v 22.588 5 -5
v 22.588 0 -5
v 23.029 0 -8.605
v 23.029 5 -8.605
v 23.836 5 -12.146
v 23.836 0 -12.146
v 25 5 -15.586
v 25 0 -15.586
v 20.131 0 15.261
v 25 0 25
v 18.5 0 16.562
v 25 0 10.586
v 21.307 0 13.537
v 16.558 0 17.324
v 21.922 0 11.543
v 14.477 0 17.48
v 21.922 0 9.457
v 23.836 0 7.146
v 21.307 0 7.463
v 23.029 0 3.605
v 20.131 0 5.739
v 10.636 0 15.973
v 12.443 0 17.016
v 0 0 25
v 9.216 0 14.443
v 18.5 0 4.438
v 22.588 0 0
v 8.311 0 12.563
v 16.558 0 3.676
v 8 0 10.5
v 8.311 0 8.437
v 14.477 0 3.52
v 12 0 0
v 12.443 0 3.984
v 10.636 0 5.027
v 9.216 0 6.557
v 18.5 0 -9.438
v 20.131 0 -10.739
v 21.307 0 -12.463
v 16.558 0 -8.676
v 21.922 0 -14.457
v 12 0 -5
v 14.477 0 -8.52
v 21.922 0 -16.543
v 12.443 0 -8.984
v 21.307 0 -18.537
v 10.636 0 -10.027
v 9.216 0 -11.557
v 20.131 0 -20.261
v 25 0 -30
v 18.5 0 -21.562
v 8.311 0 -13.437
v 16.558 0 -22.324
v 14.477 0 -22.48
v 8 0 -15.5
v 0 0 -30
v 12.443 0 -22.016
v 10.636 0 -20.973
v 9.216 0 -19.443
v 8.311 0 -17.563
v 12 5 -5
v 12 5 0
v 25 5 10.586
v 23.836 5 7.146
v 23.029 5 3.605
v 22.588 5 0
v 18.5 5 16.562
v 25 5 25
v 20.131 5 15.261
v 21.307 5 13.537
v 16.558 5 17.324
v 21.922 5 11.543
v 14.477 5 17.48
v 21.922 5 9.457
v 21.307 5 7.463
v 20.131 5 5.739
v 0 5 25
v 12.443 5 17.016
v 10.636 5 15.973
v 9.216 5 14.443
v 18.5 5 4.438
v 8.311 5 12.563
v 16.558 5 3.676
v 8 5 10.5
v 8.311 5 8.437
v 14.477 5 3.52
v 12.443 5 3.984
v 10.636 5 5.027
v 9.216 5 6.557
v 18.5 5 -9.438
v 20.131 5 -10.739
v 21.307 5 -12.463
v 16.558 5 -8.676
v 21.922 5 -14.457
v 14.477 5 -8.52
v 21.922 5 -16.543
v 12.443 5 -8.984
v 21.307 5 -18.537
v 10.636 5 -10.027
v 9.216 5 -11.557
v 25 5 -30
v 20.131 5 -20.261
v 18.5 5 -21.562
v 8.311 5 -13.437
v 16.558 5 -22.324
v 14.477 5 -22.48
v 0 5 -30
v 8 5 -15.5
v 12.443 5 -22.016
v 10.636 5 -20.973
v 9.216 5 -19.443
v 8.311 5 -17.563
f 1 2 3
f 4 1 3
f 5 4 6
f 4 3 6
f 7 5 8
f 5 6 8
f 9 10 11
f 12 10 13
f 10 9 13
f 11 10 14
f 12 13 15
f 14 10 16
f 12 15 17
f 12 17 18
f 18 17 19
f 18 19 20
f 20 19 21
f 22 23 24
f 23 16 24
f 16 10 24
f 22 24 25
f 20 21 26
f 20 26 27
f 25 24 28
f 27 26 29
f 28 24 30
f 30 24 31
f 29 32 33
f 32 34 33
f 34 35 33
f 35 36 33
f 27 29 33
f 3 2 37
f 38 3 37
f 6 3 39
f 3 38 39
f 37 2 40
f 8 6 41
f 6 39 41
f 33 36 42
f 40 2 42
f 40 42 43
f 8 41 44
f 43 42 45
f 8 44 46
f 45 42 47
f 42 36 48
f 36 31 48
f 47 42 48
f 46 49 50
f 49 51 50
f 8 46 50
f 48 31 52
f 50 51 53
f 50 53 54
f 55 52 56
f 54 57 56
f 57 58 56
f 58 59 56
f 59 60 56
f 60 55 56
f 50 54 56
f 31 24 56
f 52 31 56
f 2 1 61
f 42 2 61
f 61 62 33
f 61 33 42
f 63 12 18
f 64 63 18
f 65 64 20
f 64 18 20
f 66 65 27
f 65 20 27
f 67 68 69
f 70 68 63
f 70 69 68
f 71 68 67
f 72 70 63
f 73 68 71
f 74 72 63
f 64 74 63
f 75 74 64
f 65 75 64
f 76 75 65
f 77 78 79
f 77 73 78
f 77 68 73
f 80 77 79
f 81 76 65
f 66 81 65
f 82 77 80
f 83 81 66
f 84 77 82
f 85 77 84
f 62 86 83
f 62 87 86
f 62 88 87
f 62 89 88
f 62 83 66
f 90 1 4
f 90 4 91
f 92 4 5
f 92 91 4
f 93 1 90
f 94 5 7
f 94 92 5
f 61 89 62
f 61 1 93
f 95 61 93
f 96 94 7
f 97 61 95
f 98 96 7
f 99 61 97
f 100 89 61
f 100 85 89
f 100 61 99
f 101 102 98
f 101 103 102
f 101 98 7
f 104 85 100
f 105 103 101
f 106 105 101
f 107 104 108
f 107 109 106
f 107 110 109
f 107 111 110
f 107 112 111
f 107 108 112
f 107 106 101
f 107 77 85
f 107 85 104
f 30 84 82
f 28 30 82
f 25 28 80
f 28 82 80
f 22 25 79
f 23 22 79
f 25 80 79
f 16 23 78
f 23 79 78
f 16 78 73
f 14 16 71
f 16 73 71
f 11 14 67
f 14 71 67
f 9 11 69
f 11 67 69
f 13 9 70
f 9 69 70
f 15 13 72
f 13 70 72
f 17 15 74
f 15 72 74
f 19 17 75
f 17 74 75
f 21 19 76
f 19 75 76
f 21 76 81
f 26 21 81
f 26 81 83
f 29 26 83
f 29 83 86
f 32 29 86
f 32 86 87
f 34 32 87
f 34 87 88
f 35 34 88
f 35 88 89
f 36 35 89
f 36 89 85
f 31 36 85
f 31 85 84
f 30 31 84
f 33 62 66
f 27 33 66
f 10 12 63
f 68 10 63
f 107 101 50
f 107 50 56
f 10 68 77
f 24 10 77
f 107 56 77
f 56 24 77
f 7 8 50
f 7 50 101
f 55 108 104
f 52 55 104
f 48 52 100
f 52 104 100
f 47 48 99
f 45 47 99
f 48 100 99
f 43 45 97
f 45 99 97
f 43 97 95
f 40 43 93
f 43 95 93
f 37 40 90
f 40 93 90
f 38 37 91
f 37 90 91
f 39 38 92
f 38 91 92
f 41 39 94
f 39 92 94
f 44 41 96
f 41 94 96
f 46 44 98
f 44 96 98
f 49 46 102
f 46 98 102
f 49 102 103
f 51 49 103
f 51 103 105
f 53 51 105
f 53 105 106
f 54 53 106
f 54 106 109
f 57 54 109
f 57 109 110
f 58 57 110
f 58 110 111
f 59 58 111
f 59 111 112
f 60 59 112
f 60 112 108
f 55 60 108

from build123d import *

# Parameters (mm, degrees)
SKETCH2_W                = 20
SKETCH2_H                = 5
BOSS_EXTRUDE2_DEPTH      = 25
BOSS_EXTRUDE3_DEPTH      = 5
BOSS_EXTRUDE3_DEPTH_BACK = 25
SKETCH3_W                = 5
SKETCH3_H                = 5
SKETCH4_W                = 25
SKETCH4_H                = 5
BOSS_EXTRUDE4_DEPTH      = 25
SKETCH5_R                = 7
CUT_EXTRUDE1_DEPTH       = 30
CUT_EXTRUDE2_DEPTH       = 10
SKETCH7_W                = 5
SKETCH7_H                = 5
BOSS_EXTRUDE5_DEPTH      = 7


with BuildPart() as part:
    # Sketch2 → Boss-Extrude2 (new body)
    with BuildSketch(Plane.XY):
        with Locations((15, 2.5)):
            Rectangle(SKETCH2_W, SKETCH2_H)
    extrude(amount=BOSS_EXTRUDE2_DEPTH)

    # Sketch3 → Boss-Extrude3 (add, two sides: drawn at the far end of the back side and taken through both)
    with BuildSketch(Plane(origin=(0, 0, 0), x_dir=(-1, 0, 0), z_dir=(0, 0, -1)).offset(-BOSS_EXTRUDE3_DEPTH_BACK)):
        with Locations((-2.5, 2.5)):
            Rectangle(SKETCH3_W, SKETCH3_H)
    extrude(amount=BOSS_EXTRUDE3_DEPTH + BOSS_EXTRUDE3_DEPTH_BACK)

    # Sketch4 → Boss-Extrude4 (add)
    with BuildSketch(Plane(origin=(0, 0, -5), x_dir=(-1, 0, 0), z_dir=(0, 0, -1))):
        with Locations((-12.5, 2.5)):
            Rectangle(SKETCH4_W, SKETCH4_H)
    extrude(amount=BOSS_EXTRUDE4_DEPTH)

    # Sketch5 → Cut-Extrude1 (cut)
    with BuildSketch(Plane(origin=(0, 5, 0), x_dir=(1, 0, 0), z_dir=(0, 1, 0))):
        with Locations(Location((15, -10.5, 0), (0, 0, 180))):
            Circle(SKETCH5_R)
        with Locations(Location((15, 15.5, 0), (0, 0, 180))):
            Circle(SKETCH5_R)
    extrude(amount=-CUT_EXTRUDE1_DEPTH, mode=Mode.SUBTRACT)

    # Sketch6 → Cut-Extrude2 (cut)
    with BuildSketch(Plane.XZ):
        with BuildLine():
            ThreePointArc((22.588137581, -5), (23.386954562, -10.385878866), (25, -15.586252328))
            Line((25, -15.586252328), (25, -5))
            Line((25, -5), (22.588137581, -5))
        make_face()
        with BuildLine():
            Line((25, 0), (25, 10.586252328))
            ThreePointArc((25, 10.586252328), (23.386954562, 5.385878866), (22.588137581, 0))
            Line((22.588137581, 0), (25, 0))
        make_face()
    extrude(amount=-CUT_EXTRUDE2_DEPTH, mode=Mode.SUBTRACT)

    # Sketch7 → Boss-Extrude5 (add)
    with BuildSketch(Plane(origin=(5, 0, 0), x_dir=(0, 0, -1), z_dir=(1, 0, 0))):
        with Locations((2.5, 2.5)):
            Rectangle(SKETCH7_W, SKETCH7_H)
    extrude(amount=BOSS_EXTRUDE5_DEPTH)


solid = part.part
